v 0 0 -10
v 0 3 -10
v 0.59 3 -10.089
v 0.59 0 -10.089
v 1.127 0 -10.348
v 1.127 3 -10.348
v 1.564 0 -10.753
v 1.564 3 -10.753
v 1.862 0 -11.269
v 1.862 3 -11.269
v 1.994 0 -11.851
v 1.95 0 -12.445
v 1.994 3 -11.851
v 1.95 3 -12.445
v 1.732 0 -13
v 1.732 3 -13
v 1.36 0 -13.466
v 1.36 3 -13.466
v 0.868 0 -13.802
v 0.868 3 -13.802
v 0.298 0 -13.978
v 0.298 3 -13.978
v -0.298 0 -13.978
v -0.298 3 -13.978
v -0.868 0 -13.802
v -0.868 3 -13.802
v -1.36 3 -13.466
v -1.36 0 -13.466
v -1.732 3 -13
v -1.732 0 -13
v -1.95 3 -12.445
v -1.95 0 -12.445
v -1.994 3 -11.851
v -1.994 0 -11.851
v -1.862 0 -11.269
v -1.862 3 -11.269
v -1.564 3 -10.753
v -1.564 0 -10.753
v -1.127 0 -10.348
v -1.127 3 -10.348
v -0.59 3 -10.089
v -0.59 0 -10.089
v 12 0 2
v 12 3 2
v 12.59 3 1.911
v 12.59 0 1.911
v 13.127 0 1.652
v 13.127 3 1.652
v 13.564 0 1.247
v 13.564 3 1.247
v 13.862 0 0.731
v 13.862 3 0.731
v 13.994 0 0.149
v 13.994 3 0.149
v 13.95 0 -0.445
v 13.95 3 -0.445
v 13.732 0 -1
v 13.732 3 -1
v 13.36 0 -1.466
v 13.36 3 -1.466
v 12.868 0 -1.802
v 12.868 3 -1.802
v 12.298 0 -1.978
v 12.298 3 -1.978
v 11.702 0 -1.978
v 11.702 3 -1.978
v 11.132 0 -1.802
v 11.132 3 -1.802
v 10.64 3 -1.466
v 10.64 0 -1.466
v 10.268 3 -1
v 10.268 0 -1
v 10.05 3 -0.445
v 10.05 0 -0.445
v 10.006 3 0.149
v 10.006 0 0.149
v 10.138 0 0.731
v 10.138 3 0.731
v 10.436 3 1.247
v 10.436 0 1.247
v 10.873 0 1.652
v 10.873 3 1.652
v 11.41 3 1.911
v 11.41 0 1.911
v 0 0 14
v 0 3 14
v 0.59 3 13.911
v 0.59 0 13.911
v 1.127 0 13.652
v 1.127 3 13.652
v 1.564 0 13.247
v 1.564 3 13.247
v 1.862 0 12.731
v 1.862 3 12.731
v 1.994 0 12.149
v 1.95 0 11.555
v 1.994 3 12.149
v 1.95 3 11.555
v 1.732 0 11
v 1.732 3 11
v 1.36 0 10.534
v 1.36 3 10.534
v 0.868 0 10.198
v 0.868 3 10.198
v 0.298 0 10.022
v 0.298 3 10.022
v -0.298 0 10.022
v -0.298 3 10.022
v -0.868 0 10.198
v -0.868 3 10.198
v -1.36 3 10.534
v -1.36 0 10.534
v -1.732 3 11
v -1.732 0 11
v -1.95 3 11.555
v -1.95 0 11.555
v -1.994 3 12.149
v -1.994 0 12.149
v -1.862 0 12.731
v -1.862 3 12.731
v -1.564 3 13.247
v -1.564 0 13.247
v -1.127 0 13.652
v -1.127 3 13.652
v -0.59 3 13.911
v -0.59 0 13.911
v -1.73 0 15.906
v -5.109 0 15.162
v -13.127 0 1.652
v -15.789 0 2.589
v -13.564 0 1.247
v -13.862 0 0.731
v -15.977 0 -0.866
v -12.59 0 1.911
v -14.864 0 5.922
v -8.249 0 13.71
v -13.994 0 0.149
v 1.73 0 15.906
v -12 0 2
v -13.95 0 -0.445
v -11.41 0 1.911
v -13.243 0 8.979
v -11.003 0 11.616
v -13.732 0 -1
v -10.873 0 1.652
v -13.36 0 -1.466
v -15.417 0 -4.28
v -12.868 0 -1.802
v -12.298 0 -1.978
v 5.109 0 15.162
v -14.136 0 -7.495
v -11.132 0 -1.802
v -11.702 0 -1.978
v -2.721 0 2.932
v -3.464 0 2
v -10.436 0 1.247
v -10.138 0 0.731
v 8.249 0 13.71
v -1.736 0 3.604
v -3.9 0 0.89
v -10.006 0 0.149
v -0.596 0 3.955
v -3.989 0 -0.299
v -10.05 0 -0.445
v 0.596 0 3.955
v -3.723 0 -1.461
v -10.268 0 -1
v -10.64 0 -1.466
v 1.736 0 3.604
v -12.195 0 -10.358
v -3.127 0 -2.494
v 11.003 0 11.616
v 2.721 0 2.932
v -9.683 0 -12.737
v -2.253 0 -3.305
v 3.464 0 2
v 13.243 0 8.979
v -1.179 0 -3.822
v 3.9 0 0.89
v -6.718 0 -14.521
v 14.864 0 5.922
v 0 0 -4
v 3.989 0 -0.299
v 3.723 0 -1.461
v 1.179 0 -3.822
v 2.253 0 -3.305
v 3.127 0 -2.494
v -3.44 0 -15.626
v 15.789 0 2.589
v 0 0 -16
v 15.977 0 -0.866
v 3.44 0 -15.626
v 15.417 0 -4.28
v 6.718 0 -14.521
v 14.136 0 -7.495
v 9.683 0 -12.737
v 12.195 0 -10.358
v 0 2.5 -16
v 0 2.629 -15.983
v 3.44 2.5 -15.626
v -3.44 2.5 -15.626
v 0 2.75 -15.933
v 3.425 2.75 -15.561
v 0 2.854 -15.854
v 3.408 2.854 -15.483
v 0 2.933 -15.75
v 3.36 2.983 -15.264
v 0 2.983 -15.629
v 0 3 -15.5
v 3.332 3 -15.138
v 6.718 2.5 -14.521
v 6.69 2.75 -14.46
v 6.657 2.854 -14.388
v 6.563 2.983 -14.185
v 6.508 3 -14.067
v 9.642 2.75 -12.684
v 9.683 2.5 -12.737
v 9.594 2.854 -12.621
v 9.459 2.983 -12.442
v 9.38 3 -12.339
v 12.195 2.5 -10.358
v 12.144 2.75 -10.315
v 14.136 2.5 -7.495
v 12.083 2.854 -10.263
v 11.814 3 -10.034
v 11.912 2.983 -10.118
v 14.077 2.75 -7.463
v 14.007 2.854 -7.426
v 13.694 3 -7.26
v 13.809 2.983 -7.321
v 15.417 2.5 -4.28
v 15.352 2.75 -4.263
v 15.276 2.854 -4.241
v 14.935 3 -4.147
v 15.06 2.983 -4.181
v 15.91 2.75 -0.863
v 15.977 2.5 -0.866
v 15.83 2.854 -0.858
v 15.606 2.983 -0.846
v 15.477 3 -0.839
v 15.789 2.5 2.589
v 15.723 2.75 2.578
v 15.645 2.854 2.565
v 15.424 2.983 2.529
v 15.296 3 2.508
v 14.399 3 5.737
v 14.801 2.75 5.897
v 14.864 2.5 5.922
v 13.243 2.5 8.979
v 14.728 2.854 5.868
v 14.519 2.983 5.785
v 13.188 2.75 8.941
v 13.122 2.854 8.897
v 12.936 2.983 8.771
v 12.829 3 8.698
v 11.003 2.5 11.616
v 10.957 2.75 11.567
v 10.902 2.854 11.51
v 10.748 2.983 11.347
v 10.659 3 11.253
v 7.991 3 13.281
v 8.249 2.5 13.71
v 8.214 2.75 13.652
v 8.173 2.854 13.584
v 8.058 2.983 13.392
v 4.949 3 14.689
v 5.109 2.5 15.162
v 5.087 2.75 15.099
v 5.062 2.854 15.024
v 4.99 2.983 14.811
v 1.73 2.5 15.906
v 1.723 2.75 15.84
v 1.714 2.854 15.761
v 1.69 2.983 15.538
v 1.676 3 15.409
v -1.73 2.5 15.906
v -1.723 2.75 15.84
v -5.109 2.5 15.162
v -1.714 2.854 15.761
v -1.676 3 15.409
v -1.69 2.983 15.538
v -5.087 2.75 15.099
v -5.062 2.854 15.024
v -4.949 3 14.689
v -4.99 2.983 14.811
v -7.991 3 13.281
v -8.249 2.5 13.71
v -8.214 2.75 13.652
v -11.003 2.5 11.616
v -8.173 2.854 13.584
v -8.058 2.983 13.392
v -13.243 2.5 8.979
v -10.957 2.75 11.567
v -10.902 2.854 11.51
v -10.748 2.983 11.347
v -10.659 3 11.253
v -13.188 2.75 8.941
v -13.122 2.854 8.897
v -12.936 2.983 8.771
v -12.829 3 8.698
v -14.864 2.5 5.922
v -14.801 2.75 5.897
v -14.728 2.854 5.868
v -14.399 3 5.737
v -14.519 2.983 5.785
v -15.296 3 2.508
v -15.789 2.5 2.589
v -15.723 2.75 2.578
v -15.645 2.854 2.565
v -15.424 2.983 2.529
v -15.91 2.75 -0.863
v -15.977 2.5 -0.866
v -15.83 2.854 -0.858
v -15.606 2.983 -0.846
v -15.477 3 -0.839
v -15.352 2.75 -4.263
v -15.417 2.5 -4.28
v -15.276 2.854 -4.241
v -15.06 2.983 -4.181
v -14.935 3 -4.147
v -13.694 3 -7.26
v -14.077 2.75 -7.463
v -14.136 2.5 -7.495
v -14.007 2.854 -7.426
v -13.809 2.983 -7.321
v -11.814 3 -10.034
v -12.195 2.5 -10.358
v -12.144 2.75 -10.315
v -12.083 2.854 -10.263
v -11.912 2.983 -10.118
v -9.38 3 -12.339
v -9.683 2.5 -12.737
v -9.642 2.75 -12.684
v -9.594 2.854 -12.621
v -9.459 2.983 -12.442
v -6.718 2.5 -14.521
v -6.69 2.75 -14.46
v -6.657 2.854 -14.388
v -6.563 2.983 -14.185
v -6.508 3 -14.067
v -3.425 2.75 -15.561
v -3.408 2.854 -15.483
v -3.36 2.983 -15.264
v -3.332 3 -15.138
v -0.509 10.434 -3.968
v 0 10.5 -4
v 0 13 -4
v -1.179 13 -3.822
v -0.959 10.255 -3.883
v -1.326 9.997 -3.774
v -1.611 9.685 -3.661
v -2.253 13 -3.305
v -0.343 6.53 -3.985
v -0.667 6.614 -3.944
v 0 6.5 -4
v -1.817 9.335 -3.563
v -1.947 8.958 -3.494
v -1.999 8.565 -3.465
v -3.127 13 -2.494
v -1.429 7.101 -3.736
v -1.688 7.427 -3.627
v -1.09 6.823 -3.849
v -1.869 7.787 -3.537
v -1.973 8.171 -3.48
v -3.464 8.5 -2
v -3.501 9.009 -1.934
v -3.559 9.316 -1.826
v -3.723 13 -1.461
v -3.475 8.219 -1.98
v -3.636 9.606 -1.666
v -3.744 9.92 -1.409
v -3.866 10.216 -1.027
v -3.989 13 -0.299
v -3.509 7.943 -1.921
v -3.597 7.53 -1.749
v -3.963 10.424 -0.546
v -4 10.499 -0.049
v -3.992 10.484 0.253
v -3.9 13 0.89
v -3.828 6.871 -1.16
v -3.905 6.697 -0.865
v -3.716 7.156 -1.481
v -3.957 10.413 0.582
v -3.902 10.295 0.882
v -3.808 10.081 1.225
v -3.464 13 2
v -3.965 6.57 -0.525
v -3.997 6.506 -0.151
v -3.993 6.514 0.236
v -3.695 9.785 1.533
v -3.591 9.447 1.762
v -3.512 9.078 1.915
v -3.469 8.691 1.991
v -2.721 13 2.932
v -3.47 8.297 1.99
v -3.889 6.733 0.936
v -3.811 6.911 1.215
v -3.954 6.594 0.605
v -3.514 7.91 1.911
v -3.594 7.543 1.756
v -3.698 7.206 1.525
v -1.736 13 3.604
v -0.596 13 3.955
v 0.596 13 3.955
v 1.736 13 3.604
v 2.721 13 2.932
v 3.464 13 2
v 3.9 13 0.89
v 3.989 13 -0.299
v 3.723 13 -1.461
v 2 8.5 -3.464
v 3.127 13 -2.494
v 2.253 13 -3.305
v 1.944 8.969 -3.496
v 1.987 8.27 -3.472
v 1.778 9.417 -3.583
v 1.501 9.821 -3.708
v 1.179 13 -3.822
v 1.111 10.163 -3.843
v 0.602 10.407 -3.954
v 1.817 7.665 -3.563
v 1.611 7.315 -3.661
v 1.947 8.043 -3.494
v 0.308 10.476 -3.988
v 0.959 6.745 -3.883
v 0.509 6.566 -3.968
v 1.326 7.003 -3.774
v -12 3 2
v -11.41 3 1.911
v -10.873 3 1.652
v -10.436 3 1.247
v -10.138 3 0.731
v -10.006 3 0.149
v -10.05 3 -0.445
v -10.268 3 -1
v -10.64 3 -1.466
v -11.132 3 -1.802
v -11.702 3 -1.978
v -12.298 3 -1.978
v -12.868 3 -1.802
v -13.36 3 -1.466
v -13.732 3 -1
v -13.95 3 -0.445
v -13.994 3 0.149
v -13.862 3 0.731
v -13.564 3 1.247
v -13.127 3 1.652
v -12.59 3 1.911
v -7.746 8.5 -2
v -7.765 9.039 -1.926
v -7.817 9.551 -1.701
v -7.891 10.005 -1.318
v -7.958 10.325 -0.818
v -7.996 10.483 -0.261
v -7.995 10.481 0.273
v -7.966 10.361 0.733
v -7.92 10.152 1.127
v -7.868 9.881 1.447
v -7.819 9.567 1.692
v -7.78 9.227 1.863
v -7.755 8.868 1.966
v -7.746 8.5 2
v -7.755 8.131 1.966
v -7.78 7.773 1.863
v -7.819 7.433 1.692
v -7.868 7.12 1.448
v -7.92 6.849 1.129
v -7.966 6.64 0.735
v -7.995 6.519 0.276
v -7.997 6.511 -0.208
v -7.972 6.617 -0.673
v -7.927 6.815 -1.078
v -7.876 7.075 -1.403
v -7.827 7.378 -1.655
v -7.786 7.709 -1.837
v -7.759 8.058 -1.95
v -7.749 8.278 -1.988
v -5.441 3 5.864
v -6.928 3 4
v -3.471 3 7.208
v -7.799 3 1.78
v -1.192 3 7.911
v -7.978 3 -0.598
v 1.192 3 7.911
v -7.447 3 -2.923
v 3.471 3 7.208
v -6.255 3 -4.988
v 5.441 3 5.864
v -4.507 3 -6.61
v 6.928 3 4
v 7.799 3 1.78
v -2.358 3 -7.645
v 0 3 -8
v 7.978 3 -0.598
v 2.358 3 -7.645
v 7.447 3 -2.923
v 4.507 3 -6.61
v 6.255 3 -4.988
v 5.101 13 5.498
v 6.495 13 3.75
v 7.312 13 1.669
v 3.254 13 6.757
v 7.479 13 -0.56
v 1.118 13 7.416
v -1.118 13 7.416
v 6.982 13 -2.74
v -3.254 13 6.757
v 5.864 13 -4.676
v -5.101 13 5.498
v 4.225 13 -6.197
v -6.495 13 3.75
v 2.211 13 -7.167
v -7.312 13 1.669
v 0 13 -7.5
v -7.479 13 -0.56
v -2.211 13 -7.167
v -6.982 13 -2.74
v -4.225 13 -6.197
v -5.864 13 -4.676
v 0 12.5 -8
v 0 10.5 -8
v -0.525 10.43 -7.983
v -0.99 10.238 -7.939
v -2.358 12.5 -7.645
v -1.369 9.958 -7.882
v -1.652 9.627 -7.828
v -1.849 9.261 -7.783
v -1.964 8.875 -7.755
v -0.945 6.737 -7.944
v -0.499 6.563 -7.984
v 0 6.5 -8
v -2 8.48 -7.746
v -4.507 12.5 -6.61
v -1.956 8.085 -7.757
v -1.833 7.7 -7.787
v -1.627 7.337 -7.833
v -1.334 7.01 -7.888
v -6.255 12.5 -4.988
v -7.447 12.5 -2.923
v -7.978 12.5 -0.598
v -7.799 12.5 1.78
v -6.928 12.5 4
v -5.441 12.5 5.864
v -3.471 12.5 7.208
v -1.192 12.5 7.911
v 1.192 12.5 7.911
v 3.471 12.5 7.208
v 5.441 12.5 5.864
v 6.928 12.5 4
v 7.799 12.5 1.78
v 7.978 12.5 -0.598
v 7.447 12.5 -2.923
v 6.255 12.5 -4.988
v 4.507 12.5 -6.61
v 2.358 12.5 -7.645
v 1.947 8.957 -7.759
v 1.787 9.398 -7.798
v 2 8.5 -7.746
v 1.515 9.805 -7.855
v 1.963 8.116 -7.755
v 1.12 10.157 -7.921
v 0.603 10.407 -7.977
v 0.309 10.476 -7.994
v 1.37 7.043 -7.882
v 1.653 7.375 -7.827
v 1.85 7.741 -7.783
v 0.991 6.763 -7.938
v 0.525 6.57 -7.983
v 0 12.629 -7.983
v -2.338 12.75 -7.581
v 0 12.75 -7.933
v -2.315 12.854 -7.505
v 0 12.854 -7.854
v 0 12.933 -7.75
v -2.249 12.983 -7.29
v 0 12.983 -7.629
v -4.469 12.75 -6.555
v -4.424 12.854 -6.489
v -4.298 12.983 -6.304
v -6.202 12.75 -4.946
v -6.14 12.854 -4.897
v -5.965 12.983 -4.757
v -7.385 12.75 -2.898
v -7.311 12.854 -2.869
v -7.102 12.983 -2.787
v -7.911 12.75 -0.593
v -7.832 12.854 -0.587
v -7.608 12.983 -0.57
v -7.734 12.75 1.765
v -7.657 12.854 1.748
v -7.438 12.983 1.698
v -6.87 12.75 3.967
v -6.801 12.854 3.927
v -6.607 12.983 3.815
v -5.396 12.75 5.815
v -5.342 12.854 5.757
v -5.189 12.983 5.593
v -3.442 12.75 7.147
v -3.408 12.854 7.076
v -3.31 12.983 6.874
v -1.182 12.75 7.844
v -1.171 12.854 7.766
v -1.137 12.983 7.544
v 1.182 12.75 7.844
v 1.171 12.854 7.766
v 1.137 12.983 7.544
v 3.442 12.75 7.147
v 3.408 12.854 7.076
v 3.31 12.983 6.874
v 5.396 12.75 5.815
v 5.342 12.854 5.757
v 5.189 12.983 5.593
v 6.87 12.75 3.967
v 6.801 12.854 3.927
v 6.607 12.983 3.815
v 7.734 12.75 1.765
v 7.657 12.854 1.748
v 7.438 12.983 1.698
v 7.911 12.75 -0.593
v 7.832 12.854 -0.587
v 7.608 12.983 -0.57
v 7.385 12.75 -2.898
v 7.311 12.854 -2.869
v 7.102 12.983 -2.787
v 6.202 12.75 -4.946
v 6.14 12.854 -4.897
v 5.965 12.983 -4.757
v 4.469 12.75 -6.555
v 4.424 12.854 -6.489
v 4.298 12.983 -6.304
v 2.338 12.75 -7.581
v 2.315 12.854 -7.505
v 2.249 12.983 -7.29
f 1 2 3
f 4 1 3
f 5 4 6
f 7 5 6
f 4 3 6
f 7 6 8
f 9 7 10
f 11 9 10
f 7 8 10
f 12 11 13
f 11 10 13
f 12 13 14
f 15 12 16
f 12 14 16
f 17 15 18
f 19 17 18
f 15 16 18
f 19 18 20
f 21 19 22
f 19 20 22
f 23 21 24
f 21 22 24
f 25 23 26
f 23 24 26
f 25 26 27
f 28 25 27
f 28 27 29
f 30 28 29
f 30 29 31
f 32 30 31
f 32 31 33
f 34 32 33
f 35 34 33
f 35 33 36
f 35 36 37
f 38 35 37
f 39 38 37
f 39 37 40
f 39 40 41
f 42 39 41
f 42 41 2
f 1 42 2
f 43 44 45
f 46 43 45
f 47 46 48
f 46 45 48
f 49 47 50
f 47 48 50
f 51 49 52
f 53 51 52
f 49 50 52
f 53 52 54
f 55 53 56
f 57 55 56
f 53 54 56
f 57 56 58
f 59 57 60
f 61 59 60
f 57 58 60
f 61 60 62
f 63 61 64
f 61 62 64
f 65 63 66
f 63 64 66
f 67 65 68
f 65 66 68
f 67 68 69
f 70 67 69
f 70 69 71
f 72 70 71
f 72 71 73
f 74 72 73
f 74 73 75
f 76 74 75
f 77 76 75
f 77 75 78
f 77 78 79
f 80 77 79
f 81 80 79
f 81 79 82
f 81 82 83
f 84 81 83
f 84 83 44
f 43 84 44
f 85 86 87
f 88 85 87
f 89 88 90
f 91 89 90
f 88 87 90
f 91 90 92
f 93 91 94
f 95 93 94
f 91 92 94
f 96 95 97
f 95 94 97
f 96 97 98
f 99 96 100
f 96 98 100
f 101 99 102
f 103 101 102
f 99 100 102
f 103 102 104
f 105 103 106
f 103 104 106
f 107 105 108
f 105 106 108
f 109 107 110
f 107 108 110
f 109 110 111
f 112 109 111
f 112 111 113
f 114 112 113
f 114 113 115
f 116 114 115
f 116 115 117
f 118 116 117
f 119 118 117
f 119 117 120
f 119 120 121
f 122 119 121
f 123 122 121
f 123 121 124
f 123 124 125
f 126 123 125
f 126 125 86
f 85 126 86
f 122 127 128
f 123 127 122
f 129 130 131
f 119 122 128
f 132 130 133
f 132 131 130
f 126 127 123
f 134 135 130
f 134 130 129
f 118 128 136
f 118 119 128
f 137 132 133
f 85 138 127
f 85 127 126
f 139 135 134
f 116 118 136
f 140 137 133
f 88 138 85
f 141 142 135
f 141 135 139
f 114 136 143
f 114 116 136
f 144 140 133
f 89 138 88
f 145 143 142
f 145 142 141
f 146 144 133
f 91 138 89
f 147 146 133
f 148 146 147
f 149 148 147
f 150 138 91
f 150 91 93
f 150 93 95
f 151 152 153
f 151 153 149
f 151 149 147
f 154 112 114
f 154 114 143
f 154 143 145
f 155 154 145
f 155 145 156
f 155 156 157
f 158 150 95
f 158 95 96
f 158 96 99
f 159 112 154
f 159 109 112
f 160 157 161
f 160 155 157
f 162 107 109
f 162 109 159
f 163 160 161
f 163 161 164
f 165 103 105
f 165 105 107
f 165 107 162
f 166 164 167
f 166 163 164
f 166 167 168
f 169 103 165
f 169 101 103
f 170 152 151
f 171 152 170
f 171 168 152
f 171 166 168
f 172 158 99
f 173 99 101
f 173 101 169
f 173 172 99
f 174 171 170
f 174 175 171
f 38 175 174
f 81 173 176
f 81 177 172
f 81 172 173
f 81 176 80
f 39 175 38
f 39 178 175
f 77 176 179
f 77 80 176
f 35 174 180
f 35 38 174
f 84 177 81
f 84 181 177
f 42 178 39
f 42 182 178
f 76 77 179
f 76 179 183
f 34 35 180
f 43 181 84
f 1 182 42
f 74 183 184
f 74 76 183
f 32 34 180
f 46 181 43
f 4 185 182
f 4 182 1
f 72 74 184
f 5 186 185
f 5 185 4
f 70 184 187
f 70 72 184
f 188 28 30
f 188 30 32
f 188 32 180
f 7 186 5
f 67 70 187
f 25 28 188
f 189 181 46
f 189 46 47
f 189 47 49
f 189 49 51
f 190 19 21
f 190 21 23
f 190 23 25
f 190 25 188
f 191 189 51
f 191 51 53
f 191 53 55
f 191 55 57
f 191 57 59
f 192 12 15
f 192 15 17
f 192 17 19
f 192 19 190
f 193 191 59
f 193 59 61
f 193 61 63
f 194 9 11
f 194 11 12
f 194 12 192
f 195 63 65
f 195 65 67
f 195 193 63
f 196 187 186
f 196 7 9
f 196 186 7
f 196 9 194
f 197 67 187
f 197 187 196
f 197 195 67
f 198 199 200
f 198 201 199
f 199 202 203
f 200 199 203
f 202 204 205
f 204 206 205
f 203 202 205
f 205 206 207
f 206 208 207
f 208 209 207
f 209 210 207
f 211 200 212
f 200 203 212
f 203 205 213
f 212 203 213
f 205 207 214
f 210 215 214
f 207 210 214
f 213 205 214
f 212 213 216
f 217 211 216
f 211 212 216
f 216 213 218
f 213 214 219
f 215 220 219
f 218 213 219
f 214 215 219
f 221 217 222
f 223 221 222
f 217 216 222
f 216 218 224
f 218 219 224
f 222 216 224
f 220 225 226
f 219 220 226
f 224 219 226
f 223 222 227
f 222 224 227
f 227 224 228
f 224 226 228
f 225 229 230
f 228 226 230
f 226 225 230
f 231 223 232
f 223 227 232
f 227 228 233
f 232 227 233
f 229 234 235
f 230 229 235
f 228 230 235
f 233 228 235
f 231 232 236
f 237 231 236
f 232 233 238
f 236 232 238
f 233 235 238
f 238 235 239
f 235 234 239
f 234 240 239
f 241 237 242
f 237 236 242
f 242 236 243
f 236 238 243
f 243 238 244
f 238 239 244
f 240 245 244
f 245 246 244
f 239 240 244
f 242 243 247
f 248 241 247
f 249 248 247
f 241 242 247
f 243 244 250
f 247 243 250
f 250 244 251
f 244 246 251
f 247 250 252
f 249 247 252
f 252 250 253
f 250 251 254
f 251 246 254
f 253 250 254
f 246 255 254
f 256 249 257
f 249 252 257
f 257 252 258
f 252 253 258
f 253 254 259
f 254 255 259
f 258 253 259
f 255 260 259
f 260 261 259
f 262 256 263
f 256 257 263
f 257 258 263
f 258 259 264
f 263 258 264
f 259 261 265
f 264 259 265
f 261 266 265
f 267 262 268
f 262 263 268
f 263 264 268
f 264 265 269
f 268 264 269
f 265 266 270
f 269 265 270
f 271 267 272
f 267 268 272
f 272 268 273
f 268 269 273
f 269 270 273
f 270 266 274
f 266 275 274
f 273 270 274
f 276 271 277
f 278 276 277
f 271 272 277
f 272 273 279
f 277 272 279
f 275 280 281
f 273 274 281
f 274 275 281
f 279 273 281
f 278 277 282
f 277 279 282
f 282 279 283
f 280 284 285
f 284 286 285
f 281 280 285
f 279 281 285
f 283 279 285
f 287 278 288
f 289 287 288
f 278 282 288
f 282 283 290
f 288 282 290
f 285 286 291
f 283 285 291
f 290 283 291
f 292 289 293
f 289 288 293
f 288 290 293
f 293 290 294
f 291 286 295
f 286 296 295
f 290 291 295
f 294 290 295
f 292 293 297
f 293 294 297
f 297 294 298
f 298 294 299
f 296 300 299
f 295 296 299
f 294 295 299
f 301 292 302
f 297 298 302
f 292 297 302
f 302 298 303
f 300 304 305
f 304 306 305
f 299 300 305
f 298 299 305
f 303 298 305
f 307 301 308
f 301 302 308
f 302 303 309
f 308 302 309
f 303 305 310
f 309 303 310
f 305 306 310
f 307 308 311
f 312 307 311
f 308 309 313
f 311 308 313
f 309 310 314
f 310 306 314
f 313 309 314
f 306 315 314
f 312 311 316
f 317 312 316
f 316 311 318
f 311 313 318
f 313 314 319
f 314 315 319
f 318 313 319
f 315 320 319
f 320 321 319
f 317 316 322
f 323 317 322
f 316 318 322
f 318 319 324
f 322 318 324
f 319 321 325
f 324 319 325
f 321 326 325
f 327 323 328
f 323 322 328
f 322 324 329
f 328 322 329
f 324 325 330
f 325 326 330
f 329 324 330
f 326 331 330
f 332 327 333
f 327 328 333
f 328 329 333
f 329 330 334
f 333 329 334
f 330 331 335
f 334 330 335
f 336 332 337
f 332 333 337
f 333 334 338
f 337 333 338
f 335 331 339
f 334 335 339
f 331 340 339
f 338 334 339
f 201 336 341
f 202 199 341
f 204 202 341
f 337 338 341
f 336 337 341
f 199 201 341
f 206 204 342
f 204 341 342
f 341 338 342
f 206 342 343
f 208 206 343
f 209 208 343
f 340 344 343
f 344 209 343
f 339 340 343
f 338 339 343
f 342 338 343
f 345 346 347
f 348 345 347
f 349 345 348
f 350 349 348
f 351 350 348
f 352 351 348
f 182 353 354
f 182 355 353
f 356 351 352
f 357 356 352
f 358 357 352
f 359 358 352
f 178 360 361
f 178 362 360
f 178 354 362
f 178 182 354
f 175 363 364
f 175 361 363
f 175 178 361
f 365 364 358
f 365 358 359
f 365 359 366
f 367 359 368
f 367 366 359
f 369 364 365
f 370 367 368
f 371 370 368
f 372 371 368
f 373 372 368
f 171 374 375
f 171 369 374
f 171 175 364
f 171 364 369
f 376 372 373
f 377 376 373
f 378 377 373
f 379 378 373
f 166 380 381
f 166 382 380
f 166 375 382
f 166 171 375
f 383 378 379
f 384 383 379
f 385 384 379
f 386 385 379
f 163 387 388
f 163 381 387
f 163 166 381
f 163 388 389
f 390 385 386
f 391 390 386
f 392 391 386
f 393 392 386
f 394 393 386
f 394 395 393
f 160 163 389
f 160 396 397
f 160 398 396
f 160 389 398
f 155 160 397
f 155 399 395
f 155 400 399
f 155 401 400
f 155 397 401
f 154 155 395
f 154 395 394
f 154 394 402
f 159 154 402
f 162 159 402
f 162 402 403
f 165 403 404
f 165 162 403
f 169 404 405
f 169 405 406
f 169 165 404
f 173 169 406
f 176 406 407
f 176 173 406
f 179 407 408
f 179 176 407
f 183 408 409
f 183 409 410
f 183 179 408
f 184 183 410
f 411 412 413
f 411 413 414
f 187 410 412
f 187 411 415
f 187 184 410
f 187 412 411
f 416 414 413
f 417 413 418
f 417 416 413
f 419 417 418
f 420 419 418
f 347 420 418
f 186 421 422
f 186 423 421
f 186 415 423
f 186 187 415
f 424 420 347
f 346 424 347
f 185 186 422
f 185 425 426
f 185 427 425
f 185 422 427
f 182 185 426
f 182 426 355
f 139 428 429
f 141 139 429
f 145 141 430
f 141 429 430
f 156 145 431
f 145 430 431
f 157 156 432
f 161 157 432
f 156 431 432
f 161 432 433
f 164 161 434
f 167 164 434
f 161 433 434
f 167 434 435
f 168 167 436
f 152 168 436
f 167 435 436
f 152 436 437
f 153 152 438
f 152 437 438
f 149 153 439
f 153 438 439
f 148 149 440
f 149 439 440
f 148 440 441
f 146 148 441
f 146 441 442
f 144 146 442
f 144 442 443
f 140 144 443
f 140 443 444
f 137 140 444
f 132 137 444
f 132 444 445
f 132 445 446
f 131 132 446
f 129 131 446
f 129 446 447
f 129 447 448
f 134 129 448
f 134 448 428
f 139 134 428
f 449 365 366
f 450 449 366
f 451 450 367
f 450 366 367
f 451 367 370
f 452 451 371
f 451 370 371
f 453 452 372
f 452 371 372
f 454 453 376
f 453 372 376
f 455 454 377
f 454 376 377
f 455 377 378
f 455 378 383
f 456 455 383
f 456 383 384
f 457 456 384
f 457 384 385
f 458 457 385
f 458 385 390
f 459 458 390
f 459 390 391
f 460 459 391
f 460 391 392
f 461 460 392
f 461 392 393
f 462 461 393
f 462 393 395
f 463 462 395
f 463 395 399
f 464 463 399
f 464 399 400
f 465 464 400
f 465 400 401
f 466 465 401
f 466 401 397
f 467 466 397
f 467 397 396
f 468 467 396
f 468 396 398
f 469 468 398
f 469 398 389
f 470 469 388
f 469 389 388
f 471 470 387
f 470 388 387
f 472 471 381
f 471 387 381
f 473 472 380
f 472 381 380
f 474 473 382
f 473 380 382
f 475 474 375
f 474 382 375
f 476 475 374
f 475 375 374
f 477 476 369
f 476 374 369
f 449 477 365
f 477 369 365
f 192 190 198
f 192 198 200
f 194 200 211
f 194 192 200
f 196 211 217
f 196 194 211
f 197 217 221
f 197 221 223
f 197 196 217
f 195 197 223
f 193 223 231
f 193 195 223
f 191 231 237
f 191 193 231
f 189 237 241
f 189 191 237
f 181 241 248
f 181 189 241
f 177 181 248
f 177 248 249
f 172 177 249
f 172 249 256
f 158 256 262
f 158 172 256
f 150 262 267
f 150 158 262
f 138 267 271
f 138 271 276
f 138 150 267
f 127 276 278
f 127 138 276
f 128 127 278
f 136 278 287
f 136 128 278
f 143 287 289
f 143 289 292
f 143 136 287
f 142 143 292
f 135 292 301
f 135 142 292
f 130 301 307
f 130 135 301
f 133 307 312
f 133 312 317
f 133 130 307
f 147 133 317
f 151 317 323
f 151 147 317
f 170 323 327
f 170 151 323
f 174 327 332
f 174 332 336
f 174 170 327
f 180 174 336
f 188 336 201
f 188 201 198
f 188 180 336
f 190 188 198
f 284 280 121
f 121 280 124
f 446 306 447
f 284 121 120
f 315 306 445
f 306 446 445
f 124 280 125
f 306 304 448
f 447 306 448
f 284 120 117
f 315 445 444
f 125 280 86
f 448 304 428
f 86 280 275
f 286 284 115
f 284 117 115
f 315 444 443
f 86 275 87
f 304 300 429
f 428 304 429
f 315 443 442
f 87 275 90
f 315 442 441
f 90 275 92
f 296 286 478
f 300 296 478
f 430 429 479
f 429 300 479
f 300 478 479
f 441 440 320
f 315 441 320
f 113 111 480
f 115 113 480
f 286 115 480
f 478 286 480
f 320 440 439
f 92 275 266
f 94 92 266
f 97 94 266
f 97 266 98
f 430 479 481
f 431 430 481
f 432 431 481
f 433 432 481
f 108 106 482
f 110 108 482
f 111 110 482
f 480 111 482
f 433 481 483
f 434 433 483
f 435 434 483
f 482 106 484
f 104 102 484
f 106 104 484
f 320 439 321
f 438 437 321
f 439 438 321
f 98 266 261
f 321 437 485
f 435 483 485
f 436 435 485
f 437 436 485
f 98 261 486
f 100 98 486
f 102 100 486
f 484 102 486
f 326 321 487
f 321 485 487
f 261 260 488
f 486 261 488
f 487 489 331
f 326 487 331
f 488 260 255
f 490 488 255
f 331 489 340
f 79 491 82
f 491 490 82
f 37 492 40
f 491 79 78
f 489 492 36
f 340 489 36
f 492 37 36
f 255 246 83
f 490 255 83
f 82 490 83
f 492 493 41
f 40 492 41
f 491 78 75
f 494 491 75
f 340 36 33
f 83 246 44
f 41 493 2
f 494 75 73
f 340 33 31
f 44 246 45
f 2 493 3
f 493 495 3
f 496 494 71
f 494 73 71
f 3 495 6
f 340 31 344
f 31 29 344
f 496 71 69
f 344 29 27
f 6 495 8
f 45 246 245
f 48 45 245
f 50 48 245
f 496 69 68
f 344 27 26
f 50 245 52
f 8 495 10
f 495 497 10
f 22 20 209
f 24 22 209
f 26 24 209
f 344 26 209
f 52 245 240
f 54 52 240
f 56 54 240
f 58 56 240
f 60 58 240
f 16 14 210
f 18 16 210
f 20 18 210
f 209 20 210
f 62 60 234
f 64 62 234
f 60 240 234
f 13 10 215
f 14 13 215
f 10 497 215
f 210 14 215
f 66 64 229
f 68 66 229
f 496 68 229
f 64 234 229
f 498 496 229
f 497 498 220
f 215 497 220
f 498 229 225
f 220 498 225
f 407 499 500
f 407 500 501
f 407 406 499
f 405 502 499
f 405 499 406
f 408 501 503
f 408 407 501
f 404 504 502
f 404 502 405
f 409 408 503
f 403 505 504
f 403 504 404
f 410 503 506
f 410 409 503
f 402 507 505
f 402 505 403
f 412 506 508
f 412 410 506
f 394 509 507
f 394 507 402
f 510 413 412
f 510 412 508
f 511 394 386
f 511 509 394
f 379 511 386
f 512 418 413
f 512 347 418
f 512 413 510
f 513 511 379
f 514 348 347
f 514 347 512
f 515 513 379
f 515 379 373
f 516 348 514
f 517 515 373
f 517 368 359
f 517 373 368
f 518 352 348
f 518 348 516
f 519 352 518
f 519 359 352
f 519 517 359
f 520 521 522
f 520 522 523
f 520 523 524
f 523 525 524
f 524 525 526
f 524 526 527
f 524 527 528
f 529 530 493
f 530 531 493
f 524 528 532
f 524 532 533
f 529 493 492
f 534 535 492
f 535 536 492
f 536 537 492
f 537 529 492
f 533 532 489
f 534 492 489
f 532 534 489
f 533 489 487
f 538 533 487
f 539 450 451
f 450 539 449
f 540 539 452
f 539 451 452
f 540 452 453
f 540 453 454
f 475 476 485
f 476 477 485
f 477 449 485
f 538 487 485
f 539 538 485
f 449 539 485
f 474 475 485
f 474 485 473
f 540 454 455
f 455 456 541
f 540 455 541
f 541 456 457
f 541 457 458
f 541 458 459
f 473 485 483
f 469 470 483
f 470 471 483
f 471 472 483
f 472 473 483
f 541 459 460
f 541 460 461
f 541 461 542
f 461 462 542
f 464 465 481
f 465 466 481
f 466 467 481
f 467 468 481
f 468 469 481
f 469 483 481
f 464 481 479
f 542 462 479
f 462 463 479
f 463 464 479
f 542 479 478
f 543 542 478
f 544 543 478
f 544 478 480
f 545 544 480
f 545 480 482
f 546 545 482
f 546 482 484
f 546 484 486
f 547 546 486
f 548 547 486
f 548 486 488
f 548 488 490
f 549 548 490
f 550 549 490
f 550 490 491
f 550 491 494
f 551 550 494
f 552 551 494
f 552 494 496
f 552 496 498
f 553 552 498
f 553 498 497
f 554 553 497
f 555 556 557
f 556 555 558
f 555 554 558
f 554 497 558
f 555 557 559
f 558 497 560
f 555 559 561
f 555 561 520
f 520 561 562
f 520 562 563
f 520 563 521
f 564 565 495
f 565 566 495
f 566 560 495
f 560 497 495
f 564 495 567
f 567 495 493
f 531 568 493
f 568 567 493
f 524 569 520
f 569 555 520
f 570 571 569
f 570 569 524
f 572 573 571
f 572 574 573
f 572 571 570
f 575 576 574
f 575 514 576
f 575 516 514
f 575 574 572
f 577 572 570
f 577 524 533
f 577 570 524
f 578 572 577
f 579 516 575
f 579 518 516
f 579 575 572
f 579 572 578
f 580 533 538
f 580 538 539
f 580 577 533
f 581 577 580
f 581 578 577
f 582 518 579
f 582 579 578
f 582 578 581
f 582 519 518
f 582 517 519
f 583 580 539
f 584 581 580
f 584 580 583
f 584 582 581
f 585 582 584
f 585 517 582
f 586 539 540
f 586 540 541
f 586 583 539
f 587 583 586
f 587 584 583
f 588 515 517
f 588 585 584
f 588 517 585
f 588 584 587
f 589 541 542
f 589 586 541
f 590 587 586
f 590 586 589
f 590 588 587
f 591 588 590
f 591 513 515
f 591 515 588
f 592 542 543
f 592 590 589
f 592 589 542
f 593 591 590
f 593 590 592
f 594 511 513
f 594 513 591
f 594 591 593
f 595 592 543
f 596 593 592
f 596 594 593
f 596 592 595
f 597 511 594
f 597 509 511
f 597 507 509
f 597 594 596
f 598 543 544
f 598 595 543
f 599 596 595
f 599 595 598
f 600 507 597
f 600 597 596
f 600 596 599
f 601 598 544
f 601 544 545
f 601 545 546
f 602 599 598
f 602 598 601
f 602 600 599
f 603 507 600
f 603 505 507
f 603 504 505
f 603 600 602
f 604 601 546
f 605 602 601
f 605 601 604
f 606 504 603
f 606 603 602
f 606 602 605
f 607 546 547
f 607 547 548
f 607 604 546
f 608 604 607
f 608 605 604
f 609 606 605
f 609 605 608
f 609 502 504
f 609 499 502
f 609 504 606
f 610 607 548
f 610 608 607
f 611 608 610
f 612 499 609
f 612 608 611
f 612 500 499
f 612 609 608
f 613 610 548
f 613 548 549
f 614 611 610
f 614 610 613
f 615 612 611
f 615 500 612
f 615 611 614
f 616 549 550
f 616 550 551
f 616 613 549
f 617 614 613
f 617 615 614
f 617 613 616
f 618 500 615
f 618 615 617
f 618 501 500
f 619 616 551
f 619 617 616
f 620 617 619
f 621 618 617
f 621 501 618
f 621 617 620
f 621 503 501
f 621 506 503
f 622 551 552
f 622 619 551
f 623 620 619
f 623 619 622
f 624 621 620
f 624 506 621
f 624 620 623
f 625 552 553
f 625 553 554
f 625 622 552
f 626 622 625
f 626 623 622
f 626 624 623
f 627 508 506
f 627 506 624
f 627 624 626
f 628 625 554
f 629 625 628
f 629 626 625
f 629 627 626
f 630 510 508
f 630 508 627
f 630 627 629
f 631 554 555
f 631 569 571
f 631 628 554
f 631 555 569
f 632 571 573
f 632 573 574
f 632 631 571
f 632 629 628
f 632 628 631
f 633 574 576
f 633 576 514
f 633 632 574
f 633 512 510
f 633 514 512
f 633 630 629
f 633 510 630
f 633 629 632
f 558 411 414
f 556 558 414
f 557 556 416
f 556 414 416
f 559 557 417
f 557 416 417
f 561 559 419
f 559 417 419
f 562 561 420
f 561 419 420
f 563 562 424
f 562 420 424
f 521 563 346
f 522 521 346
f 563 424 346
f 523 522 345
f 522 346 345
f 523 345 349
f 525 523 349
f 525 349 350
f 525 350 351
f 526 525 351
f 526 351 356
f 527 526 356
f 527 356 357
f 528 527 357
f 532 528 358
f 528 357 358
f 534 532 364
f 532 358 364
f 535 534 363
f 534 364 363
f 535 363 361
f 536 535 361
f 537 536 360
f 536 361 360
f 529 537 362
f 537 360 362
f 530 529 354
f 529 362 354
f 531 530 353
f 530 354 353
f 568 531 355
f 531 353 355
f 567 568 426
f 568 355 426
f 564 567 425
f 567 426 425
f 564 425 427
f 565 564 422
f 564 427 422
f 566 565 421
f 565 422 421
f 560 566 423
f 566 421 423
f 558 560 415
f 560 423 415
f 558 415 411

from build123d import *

# Parameters (mm, degrees)
SKETCH1_R               = 8
SKETCH1_R_2             = 4
BOSS_EXTRUDE1_DEPTH     = 13
CUT_EXTRUDE1_REACH      = 19.234
CUT_EXTRUDE1_END_RADIUS = 8
SKETCH2_R               = 2
CUT_EXTRUDE2_REACH      = 19.234
CUT_EXTRUDE2_END_RADIUS = 8
SKETCH3_R               = 2
SKETCH4_R               = 16
SKETCH4_R_2             = 4
BOSS_EXTRUDE2_DEPTH     = 3
CUT_EXTRUDE3_REACH      = 26.739
SKETCH5_R               = 2
FILLET1_R               = 0.5


with BuildPart() as part:
    # Sketch1 → Boss-Extrude1 (new body)
    with BuildSketch(Plane(origin=(0, 0, 0), x_dir=(1, 0, 0), z_dir=(0, 1, 0))):
        with Locations(Location((0, 0, 0), (0, 0, 90))):
            Circle(SKETCH1_R)
        with Locations(Location((0, 0, 0), (0, 0, 90))):
            Circle(SKETCH1_R_2, mode=Mode.SUBTRACT)
    extrude(amount=BOSS_EXTRUDE1_DEPTH)

    # Cut-Extrude1: up to this cylinder (the profile starts inside it)
    cut_extrude1_end = Plane(origin=(0, 8.5, 0), z_dir=(0, -1, 0)) * Cylinder(CUT_EXTRUDE1_END_RADIUS, 55.468, mode=Mode.PRIVATE)
    # Sketch2 → Cut-Extrude1 (cut, up to the surface)
    with BuildSketch(Plane.XY, mode=Mode.PRIVATE) as cut_extrude1_sk1:
        with Locations((0, 8.5)):
            Circle(SKETCH2_R)
    cut_extrude1_tool1 = extrude(cut_extrude1_sk1.sketch, amount=-CUT_EXTRUDE1_REACH, mode=Mode.PRIVATE) & cut_extrude1_end
    add(cut_extrude1_tool1.solids().sort_by_distance((0, 8.5, 0))[0], mode=Mode.SUBTRACT)

    # Cut-Extrude2: up to this cylinder (the profile starts inside it)
    cut_extrude2_end = Plane(origin=(0, 8.5, 0), z_dir=(0, -1, 0)) * Cylinder(CUT_EXTRUDE2_END_RADIUS, 55.468, mode=Mode.PRIVATE)
    # Sketch3 → Cut-Extrude2 (cut, up to the surface)
    with BuildSketch(Plane(origin=(0, 0, 0), x_dir=(0, 0, -1), z_dir=(1, 0, 0)), mode=Mode.PRIVATE) as cut_extrude2_sk1:
        with Locations((0, 8.5)):
            Circle(SKETCH3_R)
    cut_extrude2_tool1 = extrude(cut_extrude2_sk1.sketch, amount=-CUT_EXTRUDE2_REACH, mode=Mode.PRIVATE) & cut_extrude2_end
    add(cut_extrude2_tool1.solids().sort_by_distance((0, 8.5, 0))[0], mode=Mode.SUBTRACT)

    # Sketch4 → Boss-Extrude2 (add)
    with BuildSketch(Plane.XZ):
        with Locations(Location((0, 0, 0), (0, 0, 270))):
            Circle(SKETCH4_R)
        with Locations(Location((0, 0, 0), (0, 0, 90))):
            Circle(SKETCH4_R_2, mode=Mode.SUBTRACT)
    extrude(amount=-BOSS_EXTRUDE2_DEPTH)

    # Sketch5 → Cut-Extrude3 (cut, up to next)
    with BuildSketch(Plane(origin=(0, 3, 0), x_dir=(1, 0, 0), z_dir=(0, 1, 0)), mode=Mode.PRIVATE) as cut_extrude3_sk1:
        with Locations(Location((-12, 0, 0), (0, 0, 270))):
            Circle(SKETCH5_R)
    cut_extrude3_tool1 = extrude(cut_extrude3_sk1.sketch, amount=-CUT_EXTRUDE3_REACH, mode=Mode.PRIVATE) & part.part
    # Sketch5 → Cut-Extrude3 (cut, up to next)
    with BuildSketch(Plane(origin=(0, 3, 0), x_dir=(1, 0, 0), z_dir=(0, 1, 0)), mode=Mode.PRIVATE) as cut_extrude3_sk2:
        with Locations(Location((0, 12, 0), (0, 0, 270))):
            Circle(SKETCH5_R)
    cut_extrude3_tool2 = extrude(cut_extrude3_sk2.sketch, amount=-CUT_EXTRUDE3_REACH, mode=Mode.PRIVATE) & part.part
    # Sketch5 → Cut-Extrude3 (cut, up to next)
    with BuildSketch(Plane(origin=(0, 3, 0), x_dir=(1, 0, 0), z_dir=(0, 1, 0)), mode=Mode.PRIVATE) as cut_extrude3_sk3:
        with Locations(Location((12, 0, 0), (0, 0, 270))):
            Circle(SKETCH5_R)
    cut_extrude3_tool3 = extrude(cut_extrude3_sk3.sketch, amount=-CUT_EXTRUDE3_REACH, mode=Mode.PRIVATE) & part.part
    # Sketch5 → Cut-Extrude3 (cut, up to next)
    with BuildSketch(Plane(origin=(0, 3, 0), x_dir=(1, 0, 0), z_dir=(0, 1, 0)), mode=Mode.PRIVATE) as cut_extrude3_sk4:
        with Locations(Location((0, -12, 0), (0, 0, 270))):
            Circle(SKETCH5_R)
    cut_extrude3_tool4 = extrude(cut_extrude3_sk4.sketch, amount=-CUT_EXTRUDE3_REACH, mode=Mode.PRIVATE) & part.part
    add(cut_extrude3_tool1.solids().sort_by_distance((-12, 3, 0))[0], mode=Mode.SUBTRACT)
    add(cut_extrude3_tool2.solids().sort_by_distance((0, 3, -12))[0], mode=Mode.SUBTRACT)
    add(cut_extrude3_tool3.solids().sort_by_distance((12, 3, 0))[0], mode=Mode.SUBTRACT)
    add(cut_extrude3_tool4.solids().sort_by_distance((0, 3, 12))[0], mode=Mode.SUBTRACT)

    # Fillet1
    fillet1_edges = [part.edges().sort_by_distance(p)[0] for p in [
        (0, 3, 16),
        (0, 13, 8),
    ]]
    fillet(fillet1_edges, radius=FILLET1_R)


solid = part.part
